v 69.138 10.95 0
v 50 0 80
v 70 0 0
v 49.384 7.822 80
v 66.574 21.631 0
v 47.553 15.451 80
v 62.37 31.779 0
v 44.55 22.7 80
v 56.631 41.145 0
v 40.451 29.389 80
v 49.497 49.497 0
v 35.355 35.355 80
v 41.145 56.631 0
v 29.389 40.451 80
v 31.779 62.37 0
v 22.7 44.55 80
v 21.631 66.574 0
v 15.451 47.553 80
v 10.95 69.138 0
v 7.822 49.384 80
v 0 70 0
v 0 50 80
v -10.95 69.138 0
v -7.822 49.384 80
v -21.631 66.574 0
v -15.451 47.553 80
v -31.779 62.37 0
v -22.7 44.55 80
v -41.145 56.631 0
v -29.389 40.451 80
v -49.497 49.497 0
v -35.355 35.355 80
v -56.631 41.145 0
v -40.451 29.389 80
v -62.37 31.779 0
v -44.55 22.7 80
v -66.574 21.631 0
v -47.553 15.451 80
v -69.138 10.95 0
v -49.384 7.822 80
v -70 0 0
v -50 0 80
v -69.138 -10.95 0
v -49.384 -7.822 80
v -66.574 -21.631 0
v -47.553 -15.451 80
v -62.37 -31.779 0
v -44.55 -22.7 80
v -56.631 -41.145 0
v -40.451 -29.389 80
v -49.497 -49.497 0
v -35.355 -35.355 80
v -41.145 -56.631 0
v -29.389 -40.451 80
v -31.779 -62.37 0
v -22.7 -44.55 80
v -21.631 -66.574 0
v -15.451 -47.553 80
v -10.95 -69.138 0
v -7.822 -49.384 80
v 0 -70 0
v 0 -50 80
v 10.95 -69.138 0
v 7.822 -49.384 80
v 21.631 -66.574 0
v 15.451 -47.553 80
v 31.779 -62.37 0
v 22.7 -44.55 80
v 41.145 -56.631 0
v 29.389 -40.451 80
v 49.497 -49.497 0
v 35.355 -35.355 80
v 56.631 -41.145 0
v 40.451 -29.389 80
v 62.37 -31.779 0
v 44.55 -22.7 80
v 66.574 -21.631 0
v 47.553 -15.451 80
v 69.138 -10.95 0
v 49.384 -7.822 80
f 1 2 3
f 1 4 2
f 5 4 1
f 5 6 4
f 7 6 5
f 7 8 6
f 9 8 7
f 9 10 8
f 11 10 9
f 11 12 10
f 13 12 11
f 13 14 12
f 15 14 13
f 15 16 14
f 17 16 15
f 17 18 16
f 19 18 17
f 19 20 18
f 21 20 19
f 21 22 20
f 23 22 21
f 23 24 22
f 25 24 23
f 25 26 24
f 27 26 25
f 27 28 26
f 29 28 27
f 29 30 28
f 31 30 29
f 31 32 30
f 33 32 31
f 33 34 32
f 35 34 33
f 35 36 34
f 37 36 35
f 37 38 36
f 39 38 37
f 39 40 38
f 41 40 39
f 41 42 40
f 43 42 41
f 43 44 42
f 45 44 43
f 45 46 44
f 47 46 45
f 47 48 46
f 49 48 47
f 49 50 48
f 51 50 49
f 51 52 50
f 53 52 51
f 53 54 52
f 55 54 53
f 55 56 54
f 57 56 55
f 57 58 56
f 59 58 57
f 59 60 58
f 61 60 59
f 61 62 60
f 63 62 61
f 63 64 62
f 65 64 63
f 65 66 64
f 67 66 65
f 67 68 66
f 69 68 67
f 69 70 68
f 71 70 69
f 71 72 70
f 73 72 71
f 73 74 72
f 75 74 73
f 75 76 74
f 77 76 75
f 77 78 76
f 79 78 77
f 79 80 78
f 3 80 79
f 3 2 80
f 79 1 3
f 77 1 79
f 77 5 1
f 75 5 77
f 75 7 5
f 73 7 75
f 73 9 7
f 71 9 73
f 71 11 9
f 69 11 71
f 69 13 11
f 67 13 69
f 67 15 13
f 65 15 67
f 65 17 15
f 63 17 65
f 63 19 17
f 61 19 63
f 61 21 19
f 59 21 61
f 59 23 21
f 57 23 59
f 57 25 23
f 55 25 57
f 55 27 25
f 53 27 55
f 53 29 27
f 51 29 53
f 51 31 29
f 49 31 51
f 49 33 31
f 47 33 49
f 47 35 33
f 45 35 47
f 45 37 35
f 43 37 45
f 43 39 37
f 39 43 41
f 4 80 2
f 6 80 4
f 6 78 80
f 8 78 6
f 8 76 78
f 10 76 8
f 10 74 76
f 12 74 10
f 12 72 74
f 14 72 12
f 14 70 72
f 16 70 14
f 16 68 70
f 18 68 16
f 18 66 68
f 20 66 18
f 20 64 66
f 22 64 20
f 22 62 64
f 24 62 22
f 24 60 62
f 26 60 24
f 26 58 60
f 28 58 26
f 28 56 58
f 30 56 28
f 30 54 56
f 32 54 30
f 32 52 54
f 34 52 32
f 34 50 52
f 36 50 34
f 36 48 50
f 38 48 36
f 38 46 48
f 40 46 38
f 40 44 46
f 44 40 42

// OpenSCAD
$fn = 40;

height = 80;
first_radius = 70;
second_radius = 50;


 cylinder(height,first_radius, second_radius, center=false);
